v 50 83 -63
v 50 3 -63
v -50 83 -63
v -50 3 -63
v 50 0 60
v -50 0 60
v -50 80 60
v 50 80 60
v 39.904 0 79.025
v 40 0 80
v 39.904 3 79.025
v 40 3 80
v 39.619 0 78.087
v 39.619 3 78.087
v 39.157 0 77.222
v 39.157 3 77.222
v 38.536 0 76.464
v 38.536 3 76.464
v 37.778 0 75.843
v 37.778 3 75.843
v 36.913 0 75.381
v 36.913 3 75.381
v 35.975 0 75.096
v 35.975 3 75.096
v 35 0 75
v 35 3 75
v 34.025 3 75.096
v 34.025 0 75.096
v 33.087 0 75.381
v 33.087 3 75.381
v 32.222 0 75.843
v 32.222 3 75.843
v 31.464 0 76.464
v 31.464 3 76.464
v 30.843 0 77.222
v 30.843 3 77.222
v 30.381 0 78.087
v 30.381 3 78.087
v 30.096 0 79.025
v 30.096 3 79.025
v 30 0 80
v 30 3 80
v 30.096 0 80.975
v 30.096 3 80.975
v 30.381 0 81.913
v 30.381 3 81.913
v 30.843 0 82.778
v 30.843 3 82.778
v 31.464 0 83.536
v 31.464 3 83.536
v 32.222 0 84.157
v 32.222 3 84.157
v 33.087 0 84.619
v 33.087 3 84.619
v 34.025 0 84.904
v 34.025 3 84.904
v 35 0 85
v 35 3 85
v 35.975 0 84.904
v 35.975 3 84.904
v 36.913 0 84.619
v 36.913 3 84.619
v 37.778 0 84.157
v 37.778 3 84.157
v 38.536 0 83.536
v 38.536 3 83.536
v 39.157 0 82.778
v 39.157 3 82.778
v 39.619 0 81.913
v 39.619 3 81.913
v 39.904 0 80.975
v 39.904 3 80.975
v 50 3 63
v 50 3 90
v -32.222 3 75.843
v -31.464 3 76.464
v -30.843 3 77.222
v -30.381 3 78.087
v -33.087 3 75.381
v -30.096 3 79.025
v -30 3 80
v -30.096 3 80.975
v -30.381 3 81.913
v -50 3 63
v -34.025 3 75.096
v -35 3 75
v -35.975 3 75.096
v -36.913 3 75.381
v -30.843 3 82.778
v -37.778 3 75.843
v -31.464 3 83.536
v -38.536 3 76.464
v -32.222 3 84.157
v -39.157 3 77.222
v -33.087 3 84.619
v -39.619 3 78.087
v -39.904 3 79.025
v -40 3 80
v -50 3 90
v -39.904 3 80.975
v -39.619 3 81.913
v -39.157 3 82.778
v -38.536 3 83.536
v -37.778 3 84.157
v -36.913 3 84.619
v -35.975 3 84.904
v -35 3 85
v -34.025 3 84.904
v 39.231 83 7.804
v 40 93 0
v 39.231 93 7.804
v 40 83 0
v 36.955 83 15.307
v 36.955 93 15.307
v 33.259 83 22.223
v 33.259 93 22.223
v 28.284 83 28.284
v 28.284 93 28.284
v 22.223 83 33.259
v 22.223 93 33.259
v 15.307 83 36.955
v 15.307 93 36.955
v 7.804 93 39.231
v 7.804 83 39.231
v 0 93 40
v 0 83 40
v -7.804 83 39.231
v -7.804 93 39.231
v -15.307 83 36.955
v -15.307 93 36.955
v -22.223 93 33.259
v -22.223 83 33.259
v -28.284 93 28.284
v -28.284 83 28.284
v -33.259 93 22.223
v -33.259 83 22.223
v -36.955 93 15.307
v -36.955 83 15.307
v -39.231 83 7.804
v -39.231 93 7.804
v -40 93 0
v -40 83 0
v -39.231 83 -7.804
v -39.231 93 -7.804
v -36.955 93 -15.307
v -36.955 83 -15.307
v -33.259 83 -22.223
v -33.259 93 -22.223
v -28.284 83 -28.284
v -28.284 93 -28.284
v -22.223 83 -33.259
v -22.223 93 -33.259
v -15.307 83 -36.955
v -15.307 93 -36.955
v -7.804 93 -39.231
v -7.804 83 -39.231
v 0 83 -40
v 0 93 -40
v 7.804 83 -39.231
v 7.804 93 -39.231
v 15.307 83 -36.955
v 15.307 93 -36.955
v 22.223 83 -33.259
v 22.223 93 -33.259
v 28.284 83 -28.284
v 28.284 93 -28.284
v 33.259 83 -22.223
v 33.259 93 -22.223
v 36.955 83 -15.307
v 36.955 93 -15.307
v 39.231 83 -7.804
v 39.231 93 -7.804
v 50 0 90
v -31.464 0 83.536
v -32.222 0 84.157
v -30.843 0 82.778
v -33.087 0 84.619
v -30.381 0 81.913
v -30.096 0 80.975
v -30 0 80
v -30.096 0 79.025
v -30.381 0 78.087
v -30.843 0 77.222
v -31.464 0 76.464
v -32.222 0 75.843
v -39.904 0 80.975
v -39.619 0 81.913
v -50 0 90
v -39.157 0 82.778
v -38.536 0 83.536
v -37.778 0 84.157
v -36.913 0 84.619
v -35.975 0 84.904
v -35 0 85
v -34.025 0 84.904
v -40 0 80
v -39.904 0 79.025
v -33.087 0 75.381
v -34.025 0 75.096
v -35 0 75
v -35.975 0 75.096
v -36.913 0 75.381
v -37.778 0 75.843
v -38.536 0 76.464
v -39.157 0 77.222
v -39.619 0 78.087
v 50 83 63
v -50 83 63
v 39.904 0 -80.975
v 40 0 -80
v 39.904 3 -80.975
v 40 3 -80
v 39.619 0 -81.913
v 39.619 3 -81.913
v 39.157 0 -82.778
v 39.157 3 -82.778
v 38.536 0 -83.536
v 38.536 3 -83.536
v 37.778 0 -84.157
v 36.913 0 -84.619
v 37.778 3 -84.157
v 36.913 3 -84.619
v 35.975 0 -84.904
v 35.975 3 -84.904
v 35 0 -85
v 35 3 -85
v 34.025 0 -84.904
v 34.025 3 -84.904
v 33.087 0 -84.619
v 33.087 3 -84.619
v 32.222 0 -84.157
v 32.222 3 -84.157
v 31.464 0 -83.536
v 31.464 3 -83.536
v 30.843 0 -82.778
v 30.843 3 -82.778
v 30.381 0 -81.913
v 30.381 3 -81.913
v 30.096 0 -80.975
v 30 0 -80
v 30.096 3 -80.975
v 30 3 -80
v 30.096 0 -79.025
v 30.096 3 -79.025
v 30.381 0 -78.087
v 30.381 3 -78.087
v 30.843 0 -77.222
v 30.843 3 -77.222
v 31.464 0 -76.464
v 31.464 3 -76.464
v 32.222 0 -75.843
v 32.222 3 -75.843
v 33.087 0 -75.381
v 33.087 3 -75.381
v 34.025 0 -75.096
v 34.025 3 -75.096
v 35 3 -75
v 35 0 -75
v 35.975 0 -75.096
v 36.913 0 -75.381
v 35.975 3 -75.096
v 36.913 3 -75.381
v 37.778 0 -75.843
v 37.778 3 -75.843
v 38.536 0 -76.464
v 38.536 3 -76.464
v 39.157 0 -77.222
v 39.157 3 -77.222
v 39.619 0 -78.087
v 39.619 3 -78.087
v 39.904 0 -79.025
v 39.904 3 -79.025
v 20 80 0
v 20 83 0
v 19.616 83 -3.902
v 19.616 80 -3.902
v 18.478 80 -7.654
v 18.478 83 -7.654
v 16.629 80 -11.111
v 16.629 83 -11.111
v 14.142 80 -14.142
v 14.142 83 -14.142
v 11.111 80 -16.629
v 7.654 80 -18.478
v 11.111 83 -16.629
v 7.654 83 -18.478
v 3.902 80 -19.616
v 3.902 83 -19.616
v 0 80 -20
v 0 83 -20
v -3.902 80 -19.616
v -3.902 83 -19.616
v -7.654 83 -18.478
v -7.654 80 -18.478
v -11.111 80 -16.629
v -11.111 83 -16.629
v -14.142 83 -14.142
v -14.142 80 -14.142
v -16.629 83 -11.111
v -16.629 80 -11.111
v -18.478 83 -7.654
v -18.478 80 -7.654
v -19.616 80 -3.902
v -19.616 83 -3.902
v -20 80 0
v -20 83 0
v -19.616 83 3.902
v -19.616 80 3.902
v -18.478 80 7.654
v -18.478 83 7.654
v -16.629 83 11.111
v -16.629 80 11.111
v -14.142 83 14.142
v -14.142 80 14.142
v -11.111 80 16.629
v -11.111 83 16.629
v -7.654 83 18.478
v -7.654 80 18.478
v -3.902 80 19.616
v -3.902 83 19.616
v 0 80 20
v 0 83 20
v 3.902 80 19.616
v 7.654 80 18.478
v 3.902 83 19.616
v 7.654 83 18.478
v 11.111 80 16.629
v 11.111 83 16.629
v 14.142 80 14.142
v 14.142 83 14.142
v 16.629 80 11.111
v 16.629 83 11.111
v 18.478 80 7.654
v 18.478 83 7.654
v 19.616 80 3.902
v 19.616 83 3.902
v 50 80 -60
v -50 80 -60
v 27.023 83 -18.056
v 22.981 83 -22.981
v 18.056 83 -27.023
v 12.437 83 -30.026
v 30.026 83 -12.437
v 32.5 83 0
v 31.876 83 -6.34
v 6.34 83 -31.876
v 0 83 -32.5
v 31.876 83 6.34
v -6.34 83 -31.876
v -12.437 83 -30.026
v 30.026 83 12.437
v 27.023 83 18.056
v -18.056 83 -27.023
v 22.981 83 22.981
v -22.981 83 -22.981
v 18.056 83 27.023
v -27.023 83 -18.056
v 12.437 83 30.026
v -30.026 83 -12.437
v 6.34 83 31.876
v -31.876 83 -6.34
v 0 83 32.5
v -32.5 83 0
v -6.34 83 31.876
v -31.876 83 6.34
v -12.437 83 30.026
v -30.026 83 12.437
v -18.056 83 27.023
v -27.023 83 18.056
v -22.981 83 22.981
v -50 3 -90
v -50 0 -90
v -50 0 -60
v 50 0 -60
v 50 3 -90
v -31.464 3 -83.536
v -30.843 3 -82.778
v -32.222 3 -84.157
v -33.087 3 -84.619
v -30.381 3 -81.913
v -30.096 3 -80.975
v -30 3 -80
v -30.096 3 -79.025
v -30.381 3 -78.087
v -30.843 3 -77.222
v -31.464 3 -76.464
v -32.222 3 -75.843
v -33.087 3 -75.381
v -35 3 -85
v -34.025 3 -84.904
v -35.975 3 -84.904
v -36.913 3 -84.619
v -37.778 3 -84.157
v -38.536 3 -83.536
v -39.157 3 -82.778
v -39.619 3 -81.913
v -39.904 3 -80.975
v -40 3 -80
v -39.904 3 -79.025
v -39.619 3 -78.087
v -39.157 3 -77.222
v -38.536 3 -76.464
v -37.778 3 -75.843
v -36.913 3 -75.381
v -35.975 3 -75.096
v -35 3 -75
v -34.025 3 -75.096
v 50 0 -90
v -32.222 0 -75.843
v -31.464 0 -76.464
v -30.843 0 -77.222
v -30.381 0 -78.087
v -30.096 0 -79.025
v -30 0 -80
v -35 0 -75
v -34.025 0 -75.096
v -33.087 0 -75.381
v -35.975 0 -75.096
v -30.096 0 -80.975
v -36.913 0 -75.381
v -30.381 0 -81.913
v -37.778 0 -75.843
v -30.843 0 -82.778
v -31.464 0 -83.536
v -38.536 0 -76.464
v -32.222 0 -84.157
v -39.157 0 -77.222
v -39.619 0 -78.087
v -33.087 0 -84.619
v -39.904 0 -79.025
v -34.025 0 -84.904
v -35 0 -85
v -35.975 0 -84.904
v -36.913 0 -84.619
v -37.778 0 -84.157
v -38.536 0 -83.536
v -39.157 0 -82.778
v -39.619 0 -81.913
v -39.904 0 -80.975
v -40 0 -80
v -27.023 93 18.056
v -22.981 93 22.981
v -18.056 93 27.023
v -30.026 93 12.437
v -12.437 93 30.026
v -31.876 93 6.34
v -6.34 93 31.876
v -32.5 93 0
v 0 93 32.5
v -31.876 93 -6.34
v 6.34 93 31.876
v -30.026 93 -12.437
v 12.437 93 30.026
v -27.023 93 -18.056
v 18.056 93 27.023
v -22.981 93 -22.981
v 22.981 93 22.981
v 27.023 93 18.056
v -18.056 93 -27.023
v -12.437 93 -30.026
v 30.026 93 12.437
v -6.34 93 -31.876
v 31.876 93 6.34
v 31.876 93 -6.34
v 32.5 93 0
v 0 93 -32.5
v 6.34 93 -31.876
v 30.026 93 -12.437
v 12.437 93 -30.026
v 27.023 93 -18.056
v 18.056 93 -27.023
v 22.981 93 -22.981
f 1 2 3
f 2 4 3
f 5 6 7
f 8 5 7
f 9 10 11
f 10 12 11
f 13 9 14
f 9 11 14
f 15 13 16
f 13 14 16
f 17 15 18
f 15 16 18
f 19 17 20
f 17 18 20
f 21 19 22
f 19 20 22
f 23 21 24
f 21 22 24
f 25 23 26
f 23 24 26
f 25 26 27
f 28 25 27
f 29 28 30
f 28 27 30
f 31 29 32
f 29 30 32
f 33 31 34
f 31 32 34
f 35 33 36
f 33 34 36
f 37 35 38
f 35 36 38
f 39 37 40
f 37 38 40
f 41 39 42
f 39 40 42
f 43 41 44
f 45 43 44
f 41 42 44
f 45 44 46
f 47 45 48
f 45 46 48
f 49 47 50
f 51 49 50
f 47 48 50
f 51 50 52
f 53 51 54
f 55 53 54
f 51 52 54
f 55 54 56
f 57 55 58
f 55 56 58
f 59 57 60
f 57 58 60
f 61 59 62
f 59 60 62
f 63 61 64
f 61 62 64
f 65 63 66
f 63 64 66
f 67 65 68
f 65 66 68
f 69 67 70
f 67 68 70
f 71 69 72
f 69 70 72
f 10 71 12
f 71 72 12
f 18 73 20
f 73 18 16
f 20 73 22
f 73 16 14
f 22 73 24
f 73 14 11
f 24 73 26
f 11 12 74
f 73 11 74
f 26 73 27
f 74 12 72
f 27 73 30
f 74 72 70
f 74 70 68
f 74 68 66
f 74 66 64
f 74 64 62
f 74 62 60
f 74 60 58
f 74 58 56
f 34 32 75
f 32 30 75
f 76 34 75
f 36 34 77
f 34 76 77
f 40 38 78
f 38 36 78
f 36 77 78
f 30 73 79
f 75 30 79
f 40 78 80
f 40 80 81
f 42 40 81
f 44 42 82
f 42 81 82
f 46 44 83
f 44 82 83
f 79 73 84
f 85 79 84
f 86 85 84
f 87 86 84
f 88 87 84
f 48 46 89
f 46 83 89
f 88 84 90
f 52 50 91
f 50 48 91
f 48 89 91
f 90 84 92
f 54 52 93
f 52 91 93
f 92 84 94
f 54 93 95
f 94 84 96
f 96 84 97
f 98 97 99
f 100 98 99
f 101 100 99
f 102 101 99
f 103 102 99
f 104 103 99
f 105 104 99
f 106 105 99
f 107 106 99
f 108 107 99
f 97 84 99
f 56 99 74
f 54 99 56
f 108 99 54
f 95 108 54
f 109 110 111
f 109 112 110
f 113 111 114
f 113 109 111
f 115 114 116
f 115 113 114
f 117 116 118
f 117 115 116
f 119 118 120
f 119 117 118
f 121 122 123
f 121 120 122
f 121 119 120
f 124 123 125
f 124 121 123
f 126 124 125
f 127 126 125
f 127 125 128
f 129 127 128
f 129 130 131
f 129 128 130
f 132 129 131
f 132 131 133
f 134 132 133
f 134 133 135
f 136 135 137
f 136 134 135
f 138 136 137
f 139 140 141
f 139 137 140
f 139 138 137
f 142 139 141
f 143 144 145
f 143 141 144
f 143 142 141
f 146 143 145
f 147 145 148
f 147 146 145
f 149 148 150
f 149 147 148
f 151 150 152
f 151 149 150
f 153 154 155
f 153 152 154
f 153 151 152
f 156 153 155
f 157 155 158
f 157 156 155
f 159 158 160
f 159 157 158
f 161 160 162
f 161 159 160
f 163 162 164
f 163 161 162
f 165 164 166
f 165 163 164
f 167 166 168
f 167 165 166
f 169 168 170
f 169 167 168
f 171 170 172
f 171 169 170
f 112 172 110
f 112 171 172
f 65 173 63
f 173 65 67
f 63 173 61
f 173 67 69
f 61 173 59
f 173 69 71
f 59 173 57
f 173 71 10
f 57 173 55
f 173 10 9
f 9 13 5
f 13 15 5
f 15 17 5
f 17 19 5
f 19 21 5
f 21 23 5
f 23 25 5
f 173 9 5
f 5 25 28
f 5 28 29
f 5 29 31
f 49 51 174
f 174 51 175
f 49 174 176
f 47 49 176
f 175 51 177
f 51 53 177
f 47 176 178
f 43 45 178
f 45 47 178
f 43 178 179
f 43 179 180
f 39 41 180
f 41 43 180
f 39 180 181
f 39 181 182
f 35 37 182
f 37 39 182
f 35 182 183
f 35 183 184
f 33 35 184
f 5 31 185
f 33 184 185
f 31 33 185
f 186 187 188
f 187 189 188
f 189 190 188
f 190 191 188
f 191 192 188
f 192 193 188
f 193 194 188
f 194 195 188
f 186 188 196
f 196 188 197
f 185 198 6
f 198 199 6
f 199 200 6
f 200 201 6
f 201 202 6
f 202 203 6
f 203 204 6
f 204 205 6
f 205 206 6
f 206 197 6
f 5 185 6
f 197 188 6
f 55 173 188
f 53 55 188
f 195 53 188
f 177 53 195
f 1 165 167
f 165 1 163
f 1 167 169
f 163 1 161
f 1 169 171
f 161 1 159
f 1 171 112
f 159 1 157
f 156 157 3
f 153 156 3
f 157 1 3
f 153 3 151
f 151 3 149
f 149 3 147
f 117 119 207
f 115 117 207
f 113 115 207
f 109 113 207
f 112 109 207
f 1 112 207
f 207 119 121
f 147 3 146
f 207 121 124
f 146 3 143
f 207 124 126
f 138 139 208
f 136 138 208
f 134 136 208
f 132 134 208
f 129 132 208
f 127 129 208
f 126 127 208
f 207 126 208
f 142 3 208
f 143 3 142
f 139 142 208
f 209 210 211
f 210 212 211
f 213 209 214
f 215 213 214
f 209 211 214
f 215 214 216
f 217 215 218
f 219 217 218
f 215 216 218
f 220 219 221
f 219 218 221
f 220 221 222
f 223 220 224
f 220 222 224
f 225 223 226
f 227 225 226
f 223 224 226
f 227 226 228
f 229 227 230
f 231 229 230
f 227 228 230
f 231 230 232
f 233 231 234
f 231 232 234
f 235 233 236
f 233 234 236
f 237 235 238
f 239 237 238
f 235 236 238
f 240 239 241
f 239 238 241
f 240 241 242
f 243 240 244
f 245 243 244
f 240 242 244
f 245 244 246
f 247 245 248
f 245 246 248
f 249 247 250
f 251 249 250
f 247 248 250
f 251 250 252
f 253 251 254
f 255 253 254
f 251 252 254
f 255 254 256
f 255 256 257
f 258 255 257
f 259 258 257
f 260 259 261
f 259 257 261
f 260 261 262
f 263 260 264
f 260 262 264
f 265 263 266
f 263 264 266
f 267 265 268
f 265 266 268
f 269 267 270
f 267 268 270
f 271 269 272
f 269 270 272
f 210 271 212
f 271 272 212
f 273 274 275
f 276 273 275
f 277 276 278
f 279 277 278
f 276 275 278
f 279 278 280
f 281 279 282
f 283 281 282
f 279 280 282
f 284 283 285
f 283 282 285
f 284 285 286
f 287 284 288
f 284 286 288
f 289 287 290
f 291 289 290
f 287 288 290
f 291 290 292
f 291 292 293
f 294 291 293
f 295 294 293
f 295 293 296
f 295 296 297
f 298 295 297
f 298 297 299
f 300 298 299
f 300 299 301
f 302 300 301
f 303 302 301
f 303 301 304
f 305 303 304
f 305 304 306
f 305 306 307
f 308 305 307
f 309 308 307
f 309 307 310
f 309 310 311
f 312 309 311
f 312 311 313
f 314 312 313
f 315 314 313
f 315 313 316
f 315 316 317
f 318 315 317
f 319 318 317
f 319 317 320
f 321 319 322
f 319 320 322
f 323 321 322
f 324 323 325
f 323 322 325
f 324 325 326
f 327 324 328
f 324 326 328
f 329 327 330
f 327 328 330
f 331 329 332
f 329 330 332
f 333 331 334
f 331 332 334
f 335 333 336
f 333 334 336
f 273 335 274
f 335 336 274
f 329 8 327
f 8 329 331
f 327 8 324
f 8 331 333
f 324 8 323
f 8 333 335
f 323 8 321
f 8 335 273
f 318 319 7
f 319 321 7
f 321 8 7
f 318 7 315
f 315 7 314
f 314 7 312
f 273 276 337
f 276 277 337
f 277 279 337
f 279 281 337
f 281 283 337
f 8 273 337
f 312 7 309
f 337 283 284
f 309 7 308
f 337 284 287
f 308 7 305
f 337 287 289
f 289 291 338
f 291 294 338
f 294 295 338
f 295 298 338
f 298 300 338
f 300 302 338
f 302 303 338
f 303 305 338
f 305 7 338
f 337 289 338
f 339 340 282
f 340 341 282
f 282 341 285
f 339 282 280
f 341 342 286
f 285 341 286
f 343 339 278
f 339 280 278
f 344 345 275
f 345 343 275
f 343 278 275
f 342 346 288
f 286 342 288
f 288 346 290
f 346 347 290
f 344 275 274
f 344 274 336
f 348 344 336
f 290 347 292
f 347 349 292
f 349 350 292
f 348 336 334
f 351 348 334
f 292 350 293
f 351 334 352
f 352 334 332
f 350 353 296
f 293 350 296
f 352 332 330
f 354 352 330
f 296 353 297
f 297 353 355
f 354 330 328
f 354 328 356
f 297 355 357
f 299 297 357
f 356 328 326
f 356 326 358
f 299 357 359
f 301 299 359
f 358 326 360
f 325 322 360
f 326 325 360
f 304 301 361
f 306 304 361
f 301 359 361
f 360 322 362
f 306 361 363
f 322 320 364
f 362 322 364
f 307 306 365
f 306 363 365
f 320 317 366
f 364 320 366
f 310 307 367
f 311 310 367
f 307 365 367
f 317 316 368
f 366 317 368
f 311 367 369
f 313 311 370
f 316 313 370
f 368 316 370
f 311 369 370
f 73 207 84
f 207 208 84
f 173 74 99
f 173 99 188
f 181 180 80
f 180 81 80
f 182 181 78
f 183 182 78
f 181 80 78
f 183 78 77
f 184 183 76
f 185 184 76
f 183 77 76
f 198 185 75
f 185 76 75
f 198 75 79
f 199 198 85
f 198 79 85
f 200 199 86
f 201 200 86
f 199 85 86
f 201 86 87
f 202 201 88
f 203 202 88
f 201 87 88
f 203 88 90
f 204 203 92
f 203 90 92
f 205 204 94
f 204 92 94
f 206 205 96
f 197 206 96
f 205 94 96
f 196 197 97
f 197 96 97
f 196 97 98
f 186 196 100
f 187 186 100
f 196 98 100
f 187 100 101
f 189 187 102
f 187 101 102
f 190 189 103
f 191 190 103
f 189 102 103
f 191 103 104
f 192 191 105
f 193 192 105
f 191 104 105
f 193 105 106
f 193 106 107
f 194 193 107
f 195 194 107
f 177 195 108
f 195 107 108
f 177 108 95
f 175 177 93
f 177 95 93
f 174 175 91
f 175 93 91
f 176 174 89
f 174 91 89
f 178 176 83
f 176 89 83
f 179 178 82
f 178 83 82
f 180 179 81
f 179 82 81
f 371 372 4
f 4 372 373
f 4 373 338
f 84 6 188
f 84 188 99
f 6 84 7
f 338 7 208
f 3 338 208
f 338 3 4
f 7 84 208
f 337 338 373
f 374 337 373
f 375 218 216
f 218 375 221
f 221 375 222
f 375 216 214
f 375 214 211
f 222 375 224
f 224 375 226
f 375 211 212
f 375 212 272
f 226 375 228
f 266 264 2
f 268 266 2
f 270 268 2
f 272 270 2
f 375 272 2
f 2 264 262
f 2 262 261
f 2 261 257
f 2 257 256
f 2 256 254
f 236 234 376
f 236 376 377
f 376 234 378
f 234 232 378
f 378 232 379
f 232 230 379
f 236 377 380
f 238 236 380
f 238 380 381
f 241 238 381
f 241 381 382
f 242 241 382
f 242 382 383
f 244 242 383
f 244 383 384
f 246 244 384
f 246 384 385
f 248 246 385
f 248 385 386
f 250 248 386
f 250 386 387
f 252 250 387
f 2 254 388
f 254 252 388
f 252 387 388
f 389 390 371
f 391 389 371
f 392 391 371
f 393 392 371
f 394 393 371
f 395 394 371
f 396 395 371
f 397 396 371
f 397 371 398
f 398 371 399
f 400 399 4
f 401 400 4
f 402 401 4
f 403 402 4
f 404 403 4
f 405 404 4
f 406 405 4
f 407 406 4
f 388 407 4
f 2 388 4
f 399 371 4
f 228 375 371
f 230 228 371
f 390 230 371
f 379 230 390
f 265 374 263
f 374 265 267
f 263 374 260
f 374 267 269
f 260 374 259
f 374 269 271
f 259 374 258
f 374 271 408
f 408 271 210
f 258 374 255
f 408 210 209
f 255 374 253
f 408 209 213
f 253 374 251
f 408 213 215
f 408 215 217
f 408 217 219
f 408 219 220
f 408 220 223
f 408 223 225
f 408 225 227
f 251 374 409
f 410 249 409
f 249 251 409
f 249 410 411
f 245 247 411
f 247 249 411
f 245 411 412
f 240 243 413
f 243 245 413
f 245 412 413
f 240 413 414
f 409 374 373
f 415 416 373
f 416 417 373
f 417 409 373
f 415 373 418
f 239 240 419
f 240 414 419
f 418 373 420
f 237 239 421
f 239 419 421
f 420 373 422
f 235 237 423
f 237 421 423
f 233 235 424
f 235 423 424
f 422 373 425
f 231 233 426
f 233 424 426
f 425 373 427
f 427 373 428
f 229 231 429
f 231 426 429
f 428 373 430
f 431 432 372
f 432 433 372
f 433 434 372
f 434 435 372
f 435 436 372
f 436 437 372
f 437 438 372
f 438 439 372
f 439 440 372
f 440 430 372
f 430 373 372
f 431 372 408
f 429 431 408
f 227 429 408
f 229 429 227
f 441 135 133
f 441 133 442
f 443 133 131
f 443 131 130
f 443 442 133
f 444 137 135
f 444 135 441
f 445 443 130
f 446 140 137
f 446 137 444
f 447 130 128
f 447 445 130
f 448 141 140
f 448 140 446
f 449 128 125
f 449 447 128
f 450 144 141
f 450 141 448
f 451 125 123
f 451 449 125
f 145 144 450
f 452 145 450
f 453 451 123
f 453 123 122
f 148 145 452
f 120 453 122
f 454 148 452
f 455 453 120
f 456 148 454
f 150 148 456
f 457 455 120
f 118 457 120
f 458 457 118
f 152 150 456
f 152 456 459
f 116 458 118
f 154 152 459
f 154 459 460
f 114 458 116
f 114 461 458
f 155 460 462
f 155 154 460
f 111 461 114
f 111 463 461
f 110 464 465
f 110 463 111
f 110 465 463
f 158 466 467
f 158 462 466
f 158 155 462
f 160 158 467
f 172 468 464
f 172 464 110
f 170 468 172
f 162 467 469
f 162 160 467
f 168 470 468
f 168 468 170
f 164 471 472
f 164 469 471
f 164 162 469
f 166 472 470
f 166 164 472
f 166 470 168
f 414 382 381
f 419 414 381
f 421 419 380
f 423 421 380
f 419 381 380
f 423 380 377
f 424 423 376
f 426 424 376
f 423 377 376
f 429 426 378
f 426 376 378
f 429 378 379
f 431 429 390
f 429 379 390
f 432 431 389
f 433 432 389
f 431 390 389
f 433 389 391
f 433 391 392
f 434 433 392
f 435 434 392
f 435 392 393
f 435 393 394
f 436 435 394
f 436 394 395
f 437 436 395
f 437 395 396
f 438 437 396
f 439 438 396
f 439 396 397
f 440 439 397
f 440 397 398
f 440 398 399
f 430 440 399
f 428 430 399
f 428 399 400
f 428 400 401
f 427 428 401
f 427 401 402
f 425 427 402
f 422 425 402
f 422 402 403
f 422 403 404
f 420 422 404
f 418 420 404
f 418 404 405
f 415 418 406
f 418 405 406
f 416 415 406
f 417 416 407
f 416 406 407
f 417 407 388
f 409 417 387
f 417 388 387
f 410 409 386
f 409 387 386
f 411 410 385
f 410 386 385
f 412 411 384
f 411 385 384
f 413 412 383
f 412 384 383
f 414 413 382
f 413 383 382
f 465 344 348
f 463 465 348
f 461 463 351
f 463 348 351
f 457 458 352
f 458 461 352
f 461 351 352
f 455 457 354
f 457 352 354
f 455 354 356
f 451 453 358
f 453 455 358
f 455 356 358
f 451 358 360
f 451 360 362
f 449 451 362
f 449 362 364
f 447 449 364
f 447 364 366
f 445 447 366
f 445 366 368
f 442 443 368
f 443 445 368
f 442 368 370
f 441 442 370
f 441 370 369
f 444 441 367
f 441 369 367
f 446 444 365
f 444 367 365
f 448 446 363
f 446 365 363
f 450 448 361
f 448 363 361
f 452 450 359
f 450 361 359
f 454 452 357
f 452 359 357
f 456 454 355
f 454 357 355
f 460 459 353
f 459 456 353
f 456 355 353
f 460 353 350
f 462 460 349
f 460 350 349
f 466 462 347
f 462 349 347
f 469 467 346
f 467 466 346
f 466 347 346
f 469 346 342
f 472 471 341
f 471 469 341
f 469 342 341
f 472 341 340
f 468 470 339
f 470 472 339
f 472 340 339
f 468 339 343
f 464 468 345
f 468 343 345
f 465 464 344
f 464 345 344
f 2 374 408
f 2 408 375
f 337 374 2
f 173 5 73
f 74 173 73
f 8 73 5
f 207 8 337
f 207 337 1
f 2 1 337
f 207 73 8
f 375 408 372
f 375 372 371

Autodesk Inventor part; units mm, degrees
ref_plane "YZ Plane" through (0, 0, 0) normal (1, 0, 0) x (0, 1, 0)
ref_plane "XZ Plane" through (0, 0, 0) normal (0, 1, 0) x (-1, 0, 0)
ref_plane "XY Plane" through (0, 0, 0) normal (0, 0, 1) x (1, 0, 0)
sketch "Schizzo1" plane through (0, 0, 0) normal (1, 0, 0) x (0, 1, 0)
  line L0 (0, 90) -> (0, 60)
  line L1 (0, 60) -> (80, 60)
  line L2 (80, 60) -> (80, -60)
  line L3 (80, -60) -> (0, -60)
  line L4 (0, -60) -> (0, -90)
  line L5 (0, -90) -> (3, -90)
  line L6 (3, -90) -> (3, -63)
  line L7 (3, -63) -> (83, -63)
  line L8 (83, -63) -> (83, 63)
  line L9 (83, 63) -> (3, 63)
  line L10 (3, 63) -> (3, 90)
  line L11 (3, 90) -> (0, 90)
  line L12 (0, 0) -> (59.7399, 0) construction
  line L13 (0, 0) -> (0, -69.3642) construction
  dimension "d0" = 30
  dimension "d1" = 120
  dimension "d2" = 3
  dimension "d3" = 3
  dimension "d4" = 83
  dimension "d5" = 3
extrude "Estrusione1" add sketch "Schizzo1" along normal mid plane 100
sketch "Schizzo2" plane through (-50, 83, 63) normal (0, 1, 0) x (1, 0, 0)
  circle A0 centre (50, 63) radius 40
  circle A1 centre (50, 63) radius 32.5
  circle A2 centre (50, 63) radius 20
  dimension "d8" = 80
  dimension "d9" = 65
  dimension "d10" = 40
extrude "Estrusione2" cut sketch "Schizzo2" against normal through all contours A2
extrude "Estrusione3" add sketch "Schizzo2" along normal blind 10 contours A0
sketch "Schizzo3" plane through (-50, 3, 90) normal (0, 1, 0) x (1, 0, 0)
  line L0 (100, 0) -> (100, 30) projected
  line L1 (100, 30) -> (0, 30) projected
  line L2 (0, 150) -> (100, 150) projected
  line L3 (100, 150) -> (100, 180) projected
  line L4 (0, 180) -> (100, 180) projected
  line L5 (0, 0) -> (100, 0) projected
  line L6 (0, 30) -> (0, 0) projected
  line L7 (0, 180) -> (0, 150) projected
  line L8 (100, 0) -> (85, 0)
  line L9 (85, 0) -> (85, 10)
  circle A0 centre (85, 10) radius 5
  circle A1 centre (85, 170) radius 5
  circle A2 centre (15, 10) radius 5
  circle A3 centre (15, 170) radius 5
  point P0 (50, 90)
  dimension "d15" = 15
  dimension "d16" = 10
  dimension "d17" = 10
  dimension "d20" = 160
  dimension "d23" = 70
extrude "Estrusione4" cut sketch "Schizzo3" against normal through all contours A0 | A1 | A2 | A3
sketch "Schizzo4" plane through (-50, 3, 90) normal (0, 1, 0) x (1, 0, 0)
  point P0 (50, 90)
sketch "Schizzo5" plane through (-50, 3, 90) normal (0, 1, 0) x (1, 0, 0)
  point P0 (50, 90)
properties part number "Sanson_Amedeo Analisi FEM 2"
